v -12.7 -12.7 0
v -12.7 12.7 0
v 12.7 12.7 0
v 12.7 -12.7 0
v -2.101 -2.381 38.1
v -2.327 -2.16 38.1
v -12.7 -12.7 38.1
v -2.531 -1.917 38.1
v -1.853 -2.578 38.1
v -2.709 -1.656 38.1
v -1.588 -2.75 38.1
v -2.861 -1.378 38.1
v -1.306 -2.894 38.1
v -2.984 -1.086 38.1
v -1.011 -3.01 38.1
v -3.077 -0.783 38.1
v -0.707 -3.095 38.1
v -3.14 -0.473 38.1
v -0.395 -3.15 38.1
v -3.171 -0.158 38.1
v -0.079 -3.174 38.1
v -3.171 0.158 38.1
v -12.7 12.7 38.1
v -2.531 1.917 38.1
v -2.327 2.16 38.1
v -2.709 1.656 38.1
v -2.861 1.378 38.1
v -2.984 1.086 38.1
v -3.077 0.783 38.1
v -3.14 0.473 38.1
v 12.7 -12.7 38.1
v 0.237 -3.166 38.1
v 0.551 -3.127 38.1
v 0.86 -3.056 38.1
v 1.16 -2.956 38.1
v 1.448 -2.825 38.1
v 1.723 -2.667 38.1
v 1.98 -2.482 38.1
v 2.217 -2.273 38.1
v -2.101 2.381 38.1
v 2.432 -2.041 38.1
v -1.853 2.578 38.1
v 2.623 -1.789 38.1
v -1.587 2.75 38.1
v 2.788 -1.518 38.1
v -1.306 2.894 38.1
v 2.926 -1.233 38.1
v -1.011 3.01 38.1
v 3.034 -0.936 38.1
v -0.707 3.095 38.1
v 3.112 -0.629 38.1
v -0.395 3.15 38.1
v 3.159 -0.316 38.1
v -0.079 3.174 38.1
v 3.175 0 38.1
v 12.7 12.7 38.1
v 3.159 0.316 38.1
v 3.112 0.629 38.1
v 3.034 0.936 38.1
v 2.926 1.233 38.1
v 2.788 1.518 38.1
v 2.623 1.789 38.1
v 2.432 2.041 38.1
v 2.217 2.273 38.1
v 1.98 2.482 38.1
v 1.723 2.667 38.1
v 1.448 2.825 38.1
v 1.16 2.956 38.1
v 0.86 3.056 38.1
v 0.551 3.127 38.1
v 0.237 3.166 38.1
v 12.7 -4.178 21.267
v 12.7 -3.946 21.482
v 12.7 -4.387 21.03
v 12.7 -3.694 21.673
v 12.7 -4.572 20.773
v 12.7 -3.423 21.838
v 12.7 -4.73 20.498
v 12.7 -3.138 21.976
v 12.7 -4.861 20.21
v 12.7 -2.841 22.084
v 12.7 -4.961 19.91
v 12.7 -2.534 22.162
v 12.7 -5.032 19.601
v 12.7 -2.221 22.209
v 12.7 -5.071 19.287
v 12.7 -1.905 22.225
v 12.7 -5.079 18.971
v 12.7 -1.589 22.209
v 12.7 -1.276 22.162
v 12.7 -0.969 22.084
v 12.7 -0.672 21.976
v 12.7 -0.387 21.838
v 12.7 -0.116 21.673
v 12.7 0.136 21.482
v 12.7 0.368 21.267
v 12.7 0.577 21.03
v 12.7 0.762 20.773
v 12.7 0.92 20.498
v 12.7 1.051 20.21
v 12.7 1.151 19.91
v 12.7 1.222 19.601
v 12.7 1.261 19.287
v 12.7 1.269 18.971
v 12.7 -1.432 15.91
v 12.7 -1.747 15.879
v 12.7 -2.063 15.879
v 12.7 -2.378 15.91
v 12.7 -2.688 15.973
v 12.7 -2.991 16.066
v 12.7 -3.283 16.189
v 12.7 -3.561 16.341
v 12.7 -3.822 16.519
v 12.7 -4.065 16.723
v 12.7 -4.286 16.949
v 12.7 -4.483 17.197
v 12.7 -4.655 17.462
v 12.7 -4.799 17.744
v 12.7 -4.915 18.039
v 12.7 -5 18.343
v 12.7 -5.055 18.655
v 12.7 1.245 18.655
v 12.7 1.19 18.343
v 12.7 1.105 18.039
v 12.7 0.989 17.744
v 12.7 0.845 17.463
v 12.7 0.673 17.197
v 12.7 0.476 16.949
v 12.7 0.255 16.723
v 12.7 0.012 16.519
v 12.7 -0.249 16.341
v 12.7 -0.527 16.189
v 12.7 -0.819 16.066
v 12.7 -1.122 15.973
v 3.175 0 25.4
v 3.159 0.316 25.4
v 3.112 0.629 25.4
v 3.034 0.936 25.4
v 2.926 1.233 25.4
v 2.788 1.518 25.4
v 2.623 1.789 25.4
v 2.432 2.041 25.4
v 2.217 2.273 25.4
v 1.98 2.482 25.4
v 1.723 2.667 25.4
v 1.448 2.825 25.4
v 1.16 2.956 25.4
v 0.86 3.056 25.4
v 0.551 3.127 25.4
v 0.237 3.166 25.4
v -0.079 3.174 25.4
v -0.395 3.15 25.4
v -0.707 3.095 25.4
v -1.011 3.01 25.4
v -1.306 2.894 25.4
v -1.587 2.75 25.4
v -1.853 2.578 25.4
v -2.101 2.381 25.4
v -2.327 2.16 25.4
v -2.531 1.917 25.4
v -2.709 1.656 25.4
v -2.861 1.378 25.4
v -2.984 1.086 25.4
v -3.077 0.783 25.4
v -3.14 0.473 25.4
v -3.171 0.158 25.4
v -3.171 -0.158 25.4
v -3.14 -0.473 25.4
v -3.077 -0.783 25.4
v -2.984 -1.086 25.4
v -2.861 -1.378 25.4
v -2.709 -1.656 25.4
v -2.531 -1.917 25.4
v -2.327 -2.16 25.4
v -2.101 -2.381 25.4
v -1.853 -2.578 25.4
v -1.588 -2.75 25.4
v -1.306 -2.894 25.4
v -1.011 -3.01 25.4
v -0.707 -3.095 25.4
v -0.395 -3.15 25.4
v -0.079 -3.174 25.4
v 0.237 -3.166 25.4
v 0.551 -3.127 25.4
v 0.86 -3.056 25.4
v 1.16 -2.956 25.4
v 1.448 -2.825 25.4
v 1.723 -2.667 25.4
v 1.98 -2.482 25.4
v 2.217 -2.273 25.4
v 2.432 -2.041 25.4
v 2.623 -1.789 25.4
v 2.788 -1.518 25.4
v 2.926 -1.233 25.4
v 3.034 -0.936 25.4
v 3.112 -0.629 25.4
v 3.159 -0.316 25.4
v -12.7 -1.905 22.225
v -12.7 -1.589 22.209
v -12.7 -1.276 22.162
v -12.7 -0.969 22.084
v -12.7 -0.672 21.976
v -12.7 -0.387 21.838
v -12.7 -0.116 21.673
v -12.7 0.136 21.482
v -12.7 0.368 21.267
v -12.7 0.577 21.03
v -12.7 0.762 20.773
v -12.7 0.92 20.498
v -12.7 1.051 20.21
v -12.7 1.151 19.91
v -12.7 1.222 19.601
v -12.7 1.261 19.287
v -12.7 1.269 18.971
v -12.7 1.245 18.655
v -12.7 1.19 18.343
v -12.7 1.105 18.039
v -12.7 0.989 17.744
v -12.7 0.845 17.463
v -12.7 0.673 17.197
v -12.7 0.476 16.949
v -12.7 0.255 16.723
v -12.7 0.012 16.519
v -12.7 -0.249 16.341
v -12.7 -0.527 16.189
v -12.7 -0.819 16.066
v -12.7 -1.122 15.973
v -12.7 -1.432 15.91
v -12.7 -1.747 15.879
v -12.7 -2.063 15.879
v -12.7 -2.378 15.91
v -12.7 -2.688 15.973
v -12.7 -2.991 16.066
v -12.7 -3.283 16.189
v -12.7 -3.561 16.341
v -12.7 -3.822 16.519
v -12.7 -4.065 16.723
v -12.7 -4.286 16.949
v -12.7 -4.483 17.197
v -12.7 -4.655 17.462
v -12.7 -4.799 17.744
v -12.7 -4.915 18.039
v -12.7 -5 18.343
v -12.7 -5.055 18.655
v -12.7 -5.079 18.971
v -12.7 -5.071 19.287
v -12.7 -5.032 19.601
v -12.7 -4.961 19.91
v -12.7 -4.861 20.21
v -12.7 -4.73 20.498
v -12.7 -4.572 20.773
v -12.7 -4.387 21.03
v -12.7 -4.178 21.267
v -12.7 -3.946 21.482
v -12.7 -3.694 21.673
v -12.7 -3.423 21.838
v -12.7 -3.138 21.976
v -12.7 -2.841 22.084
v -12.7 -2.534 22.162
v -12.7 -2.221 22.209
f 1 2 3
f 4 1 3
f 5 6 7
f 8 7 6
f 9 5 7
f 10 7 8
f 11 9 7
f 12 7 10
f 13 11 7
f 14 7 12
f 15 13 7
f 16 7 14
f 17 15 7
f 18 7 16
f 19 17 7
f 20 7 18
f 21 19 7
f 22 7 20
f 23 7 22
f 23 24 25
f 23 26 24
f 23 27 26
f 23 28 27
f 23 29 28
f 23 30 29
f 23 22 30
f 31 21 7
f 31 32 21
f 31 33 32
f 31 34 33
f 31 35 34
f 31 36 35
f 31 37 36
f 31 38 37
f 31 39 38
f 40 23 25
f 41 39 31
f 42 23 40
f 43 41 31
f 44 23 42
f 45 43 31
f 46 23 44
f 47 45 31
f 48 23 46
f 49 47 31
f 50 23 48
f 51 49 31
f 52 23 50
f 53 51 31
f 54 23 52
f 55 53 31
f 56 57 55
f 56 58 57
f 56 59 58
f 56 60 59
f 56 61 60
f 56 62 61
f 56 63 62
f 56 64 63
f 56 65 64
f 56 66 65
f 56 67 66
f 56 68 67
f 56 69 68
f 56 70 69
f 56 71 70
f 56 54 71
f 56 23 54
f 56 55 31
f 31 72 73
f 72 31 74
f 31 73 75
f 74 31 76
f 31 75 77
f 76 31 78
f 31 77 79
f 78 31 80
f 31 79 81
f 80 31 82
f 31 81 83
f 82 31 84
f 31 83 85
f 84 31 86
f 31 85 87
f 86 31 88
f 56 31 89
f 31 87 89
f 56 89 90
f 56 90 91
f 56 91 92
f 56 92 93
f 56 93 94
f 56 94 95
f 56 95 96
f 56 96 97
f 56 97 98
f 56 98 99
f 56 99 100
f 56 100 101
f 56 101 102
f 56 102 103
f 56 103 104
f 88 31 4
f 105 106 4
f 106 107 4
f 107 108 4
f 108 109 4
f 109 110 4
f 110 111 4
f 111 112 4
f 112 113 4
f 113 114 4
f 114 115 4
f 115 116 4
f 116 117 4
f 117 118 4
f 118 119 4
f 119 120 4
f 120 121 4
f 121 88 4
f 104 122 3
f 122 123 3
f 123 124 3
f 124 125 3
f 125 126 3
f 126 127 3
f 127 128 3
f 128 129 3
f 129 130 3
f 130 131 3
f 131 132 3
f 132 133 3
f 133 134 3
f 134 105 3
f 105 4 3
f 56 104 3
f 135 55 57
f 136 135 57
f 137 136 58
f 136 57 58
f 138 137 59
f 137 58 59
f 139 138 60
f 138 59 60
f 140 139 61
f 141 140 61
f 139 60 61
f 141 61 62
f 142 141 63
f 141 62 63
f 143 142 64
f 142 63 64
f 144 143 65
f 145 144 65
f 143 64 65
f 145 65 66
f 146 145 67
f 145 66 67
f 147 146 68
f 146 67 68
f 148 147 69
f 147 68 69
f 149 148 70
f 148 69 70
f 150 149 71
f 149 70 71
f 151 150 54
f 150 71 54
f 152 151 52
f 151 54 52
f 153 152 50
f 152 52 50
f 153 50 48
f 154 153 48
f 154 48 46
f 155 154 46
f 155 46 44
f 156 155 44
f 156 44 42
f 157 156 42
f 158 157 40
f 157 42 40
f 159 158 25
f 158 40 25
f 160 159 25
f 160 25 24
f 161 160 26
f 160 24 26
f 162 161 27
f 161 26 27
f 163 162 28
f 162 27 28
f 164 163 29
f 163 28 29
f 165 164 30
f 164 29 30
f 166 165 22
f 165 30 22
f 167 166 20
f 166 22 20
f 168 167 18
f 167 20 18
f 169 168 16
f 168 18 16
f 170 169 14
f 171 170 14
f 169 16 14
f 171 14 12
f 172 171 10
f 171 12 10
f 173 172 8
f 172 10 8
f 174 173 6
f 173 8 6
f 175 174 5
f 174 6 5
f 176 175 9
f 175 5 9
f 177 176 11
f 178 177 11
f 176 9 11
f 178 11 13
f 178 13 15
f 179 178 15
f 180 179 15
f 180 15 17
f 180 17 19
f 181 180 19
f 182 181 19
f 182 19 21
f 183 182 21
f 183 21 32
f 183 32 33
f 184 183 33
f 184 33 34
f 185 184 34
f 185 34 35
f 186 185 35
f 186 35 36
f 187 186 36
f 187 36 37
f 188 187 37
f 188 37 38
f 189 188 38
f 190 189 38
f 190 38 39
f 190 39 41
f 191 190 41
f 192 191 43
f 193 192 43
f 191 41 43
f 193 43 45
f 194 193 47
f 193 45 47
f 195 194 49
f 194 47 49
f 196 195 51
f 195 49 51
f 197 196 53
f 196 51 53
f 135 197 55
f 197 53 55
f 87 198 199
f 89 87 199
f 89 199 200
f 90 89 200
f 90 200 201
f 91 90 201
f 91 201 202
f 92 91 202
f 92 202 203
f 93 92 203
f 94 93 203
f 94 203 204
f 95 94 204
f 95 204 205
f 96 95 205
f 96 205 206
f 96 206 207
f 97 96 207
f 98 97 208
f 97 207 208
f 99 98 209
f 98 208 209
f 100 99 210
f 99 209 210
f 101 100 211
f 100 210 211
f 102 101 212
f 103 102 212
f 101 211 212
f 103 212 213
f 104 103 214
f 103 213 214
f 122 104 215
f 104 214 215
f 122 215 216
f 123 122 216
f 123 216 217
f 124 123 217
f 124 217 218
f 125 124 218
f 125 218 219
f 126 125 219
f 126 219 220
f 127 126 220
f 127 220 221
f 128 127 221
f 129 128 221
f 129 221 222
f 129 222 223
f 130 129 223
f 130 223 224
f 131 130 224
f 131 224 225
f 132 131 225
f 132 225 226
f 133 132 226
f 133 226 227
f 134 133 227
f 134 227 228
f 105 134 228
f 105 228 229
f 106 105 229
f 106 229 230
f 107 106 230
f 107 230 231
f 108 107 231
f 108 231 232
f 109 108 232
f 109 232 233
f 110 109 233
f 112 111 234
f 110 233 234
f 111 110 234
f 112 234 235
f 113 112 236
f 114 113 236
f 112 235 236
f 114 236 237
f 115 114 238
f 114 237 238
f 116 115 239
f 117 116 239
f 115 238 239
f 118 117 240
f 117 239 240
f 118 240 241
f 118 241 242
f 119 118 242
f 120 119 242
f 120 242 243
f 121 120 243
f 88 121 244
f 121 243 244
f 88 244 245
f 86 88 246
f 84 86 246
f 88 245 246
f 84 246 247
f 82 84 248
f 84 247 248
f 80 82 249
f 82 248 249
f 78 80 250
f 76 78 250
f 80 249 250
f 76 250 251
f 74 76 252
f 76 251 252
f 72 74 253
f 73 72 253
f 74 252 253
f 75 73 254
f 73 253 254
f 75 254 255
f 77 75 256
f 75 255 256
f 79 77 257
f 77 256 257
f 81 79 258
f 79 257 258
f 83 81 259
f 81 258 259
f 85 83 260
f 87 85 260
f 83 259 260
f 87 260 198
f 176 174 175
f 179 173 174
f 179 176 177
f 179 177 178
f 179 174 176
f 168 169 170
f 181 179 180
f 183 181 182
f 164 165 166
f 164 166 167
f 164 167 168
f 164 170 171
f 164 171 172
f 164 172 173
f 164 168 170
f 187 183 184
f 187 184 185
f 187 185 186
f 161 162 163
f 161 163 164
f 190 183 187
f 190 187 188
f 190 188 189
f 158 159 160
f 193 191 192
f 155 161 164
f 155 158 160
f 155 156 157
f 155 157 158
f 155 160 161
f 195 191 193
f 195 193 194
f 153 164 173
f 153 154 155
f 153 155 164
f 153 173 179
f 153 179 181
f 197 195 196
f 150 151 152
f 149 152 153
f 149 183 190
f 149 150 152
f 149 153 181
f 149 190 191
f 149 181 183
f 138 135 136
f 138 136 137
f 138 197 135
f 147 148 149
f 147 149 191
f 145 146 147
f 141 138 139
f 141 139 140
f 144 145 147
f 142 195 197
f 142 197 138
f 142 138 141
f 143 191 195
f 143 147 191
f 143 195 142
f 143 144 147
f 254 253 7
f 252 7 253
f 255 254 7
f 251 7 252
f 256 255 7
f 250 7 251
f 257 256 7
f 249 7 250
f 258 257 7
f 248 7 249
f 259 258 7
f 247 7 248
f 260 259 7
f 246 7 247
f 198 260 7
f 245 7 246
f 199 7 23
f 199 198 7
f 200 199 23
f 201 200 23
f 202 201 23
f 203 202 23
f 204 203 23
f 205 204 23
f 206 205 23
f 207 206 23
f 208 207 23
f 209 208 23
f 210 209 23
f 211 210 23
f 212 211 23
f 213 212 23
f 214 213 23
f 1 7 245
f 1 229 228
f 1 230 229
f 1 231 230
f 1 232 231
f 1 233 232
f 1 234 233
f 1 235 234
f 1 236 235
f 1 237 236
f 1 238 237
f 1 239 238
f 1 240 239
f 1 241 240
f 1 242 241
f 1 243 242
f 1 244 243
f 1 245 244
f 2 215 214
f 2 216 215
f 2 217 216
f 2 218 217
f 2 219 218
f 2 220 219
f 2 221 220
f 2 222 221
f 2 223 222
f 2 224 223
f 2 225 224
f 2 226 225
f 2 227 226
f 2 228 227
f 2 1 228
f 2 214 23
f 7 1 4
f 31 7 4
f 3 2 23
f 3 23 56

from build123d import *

# Parameters (mm, degrees)
SKETCH1_W           = 25.4
SKETCH1_H           = 25.4
BOSS_EXTRUDE1_DEPTH = 38.1
SKETCH3_R           = 3.175
CUT_EXTRUDE1_DEPTH  = 12.7
SKETCH2_R           = 3.175
CUT_EXTRUDE2_DEPTH  = 48.519048812


with BuildPart() as part:
    # Sketch1 → Boss-Extrude1 (new body)
    with BuildSketch(Plane.XY):
        Rectangle(SKETCH1_W, SKETCH1_H)
    extrude(amount=BOSS_EXTRUDE1_DEPTH)

    # Sketch3 → Cut-Extrude1 (cut)
    with BuildSketch(Plane.XY.offset(38.1)):
        Circle(SKETCH3_R)
    extrude(amount=-CUT_EXTRUDE1_DEPTH, mode=Mode.SUBTRACT)

    # Sketch2 → Cut-Extrude2 (cut, through all)
    with BuildSketch(Plane.ZY.offset(12.7)):
        with Locations((19.05, -1.905)):
            Circle(SKETCH2_R)
    extrude(amount=-CUT_EXTRUDE2_DEPTH, mode=Mode.SUBTRACT)


solid = part.part
